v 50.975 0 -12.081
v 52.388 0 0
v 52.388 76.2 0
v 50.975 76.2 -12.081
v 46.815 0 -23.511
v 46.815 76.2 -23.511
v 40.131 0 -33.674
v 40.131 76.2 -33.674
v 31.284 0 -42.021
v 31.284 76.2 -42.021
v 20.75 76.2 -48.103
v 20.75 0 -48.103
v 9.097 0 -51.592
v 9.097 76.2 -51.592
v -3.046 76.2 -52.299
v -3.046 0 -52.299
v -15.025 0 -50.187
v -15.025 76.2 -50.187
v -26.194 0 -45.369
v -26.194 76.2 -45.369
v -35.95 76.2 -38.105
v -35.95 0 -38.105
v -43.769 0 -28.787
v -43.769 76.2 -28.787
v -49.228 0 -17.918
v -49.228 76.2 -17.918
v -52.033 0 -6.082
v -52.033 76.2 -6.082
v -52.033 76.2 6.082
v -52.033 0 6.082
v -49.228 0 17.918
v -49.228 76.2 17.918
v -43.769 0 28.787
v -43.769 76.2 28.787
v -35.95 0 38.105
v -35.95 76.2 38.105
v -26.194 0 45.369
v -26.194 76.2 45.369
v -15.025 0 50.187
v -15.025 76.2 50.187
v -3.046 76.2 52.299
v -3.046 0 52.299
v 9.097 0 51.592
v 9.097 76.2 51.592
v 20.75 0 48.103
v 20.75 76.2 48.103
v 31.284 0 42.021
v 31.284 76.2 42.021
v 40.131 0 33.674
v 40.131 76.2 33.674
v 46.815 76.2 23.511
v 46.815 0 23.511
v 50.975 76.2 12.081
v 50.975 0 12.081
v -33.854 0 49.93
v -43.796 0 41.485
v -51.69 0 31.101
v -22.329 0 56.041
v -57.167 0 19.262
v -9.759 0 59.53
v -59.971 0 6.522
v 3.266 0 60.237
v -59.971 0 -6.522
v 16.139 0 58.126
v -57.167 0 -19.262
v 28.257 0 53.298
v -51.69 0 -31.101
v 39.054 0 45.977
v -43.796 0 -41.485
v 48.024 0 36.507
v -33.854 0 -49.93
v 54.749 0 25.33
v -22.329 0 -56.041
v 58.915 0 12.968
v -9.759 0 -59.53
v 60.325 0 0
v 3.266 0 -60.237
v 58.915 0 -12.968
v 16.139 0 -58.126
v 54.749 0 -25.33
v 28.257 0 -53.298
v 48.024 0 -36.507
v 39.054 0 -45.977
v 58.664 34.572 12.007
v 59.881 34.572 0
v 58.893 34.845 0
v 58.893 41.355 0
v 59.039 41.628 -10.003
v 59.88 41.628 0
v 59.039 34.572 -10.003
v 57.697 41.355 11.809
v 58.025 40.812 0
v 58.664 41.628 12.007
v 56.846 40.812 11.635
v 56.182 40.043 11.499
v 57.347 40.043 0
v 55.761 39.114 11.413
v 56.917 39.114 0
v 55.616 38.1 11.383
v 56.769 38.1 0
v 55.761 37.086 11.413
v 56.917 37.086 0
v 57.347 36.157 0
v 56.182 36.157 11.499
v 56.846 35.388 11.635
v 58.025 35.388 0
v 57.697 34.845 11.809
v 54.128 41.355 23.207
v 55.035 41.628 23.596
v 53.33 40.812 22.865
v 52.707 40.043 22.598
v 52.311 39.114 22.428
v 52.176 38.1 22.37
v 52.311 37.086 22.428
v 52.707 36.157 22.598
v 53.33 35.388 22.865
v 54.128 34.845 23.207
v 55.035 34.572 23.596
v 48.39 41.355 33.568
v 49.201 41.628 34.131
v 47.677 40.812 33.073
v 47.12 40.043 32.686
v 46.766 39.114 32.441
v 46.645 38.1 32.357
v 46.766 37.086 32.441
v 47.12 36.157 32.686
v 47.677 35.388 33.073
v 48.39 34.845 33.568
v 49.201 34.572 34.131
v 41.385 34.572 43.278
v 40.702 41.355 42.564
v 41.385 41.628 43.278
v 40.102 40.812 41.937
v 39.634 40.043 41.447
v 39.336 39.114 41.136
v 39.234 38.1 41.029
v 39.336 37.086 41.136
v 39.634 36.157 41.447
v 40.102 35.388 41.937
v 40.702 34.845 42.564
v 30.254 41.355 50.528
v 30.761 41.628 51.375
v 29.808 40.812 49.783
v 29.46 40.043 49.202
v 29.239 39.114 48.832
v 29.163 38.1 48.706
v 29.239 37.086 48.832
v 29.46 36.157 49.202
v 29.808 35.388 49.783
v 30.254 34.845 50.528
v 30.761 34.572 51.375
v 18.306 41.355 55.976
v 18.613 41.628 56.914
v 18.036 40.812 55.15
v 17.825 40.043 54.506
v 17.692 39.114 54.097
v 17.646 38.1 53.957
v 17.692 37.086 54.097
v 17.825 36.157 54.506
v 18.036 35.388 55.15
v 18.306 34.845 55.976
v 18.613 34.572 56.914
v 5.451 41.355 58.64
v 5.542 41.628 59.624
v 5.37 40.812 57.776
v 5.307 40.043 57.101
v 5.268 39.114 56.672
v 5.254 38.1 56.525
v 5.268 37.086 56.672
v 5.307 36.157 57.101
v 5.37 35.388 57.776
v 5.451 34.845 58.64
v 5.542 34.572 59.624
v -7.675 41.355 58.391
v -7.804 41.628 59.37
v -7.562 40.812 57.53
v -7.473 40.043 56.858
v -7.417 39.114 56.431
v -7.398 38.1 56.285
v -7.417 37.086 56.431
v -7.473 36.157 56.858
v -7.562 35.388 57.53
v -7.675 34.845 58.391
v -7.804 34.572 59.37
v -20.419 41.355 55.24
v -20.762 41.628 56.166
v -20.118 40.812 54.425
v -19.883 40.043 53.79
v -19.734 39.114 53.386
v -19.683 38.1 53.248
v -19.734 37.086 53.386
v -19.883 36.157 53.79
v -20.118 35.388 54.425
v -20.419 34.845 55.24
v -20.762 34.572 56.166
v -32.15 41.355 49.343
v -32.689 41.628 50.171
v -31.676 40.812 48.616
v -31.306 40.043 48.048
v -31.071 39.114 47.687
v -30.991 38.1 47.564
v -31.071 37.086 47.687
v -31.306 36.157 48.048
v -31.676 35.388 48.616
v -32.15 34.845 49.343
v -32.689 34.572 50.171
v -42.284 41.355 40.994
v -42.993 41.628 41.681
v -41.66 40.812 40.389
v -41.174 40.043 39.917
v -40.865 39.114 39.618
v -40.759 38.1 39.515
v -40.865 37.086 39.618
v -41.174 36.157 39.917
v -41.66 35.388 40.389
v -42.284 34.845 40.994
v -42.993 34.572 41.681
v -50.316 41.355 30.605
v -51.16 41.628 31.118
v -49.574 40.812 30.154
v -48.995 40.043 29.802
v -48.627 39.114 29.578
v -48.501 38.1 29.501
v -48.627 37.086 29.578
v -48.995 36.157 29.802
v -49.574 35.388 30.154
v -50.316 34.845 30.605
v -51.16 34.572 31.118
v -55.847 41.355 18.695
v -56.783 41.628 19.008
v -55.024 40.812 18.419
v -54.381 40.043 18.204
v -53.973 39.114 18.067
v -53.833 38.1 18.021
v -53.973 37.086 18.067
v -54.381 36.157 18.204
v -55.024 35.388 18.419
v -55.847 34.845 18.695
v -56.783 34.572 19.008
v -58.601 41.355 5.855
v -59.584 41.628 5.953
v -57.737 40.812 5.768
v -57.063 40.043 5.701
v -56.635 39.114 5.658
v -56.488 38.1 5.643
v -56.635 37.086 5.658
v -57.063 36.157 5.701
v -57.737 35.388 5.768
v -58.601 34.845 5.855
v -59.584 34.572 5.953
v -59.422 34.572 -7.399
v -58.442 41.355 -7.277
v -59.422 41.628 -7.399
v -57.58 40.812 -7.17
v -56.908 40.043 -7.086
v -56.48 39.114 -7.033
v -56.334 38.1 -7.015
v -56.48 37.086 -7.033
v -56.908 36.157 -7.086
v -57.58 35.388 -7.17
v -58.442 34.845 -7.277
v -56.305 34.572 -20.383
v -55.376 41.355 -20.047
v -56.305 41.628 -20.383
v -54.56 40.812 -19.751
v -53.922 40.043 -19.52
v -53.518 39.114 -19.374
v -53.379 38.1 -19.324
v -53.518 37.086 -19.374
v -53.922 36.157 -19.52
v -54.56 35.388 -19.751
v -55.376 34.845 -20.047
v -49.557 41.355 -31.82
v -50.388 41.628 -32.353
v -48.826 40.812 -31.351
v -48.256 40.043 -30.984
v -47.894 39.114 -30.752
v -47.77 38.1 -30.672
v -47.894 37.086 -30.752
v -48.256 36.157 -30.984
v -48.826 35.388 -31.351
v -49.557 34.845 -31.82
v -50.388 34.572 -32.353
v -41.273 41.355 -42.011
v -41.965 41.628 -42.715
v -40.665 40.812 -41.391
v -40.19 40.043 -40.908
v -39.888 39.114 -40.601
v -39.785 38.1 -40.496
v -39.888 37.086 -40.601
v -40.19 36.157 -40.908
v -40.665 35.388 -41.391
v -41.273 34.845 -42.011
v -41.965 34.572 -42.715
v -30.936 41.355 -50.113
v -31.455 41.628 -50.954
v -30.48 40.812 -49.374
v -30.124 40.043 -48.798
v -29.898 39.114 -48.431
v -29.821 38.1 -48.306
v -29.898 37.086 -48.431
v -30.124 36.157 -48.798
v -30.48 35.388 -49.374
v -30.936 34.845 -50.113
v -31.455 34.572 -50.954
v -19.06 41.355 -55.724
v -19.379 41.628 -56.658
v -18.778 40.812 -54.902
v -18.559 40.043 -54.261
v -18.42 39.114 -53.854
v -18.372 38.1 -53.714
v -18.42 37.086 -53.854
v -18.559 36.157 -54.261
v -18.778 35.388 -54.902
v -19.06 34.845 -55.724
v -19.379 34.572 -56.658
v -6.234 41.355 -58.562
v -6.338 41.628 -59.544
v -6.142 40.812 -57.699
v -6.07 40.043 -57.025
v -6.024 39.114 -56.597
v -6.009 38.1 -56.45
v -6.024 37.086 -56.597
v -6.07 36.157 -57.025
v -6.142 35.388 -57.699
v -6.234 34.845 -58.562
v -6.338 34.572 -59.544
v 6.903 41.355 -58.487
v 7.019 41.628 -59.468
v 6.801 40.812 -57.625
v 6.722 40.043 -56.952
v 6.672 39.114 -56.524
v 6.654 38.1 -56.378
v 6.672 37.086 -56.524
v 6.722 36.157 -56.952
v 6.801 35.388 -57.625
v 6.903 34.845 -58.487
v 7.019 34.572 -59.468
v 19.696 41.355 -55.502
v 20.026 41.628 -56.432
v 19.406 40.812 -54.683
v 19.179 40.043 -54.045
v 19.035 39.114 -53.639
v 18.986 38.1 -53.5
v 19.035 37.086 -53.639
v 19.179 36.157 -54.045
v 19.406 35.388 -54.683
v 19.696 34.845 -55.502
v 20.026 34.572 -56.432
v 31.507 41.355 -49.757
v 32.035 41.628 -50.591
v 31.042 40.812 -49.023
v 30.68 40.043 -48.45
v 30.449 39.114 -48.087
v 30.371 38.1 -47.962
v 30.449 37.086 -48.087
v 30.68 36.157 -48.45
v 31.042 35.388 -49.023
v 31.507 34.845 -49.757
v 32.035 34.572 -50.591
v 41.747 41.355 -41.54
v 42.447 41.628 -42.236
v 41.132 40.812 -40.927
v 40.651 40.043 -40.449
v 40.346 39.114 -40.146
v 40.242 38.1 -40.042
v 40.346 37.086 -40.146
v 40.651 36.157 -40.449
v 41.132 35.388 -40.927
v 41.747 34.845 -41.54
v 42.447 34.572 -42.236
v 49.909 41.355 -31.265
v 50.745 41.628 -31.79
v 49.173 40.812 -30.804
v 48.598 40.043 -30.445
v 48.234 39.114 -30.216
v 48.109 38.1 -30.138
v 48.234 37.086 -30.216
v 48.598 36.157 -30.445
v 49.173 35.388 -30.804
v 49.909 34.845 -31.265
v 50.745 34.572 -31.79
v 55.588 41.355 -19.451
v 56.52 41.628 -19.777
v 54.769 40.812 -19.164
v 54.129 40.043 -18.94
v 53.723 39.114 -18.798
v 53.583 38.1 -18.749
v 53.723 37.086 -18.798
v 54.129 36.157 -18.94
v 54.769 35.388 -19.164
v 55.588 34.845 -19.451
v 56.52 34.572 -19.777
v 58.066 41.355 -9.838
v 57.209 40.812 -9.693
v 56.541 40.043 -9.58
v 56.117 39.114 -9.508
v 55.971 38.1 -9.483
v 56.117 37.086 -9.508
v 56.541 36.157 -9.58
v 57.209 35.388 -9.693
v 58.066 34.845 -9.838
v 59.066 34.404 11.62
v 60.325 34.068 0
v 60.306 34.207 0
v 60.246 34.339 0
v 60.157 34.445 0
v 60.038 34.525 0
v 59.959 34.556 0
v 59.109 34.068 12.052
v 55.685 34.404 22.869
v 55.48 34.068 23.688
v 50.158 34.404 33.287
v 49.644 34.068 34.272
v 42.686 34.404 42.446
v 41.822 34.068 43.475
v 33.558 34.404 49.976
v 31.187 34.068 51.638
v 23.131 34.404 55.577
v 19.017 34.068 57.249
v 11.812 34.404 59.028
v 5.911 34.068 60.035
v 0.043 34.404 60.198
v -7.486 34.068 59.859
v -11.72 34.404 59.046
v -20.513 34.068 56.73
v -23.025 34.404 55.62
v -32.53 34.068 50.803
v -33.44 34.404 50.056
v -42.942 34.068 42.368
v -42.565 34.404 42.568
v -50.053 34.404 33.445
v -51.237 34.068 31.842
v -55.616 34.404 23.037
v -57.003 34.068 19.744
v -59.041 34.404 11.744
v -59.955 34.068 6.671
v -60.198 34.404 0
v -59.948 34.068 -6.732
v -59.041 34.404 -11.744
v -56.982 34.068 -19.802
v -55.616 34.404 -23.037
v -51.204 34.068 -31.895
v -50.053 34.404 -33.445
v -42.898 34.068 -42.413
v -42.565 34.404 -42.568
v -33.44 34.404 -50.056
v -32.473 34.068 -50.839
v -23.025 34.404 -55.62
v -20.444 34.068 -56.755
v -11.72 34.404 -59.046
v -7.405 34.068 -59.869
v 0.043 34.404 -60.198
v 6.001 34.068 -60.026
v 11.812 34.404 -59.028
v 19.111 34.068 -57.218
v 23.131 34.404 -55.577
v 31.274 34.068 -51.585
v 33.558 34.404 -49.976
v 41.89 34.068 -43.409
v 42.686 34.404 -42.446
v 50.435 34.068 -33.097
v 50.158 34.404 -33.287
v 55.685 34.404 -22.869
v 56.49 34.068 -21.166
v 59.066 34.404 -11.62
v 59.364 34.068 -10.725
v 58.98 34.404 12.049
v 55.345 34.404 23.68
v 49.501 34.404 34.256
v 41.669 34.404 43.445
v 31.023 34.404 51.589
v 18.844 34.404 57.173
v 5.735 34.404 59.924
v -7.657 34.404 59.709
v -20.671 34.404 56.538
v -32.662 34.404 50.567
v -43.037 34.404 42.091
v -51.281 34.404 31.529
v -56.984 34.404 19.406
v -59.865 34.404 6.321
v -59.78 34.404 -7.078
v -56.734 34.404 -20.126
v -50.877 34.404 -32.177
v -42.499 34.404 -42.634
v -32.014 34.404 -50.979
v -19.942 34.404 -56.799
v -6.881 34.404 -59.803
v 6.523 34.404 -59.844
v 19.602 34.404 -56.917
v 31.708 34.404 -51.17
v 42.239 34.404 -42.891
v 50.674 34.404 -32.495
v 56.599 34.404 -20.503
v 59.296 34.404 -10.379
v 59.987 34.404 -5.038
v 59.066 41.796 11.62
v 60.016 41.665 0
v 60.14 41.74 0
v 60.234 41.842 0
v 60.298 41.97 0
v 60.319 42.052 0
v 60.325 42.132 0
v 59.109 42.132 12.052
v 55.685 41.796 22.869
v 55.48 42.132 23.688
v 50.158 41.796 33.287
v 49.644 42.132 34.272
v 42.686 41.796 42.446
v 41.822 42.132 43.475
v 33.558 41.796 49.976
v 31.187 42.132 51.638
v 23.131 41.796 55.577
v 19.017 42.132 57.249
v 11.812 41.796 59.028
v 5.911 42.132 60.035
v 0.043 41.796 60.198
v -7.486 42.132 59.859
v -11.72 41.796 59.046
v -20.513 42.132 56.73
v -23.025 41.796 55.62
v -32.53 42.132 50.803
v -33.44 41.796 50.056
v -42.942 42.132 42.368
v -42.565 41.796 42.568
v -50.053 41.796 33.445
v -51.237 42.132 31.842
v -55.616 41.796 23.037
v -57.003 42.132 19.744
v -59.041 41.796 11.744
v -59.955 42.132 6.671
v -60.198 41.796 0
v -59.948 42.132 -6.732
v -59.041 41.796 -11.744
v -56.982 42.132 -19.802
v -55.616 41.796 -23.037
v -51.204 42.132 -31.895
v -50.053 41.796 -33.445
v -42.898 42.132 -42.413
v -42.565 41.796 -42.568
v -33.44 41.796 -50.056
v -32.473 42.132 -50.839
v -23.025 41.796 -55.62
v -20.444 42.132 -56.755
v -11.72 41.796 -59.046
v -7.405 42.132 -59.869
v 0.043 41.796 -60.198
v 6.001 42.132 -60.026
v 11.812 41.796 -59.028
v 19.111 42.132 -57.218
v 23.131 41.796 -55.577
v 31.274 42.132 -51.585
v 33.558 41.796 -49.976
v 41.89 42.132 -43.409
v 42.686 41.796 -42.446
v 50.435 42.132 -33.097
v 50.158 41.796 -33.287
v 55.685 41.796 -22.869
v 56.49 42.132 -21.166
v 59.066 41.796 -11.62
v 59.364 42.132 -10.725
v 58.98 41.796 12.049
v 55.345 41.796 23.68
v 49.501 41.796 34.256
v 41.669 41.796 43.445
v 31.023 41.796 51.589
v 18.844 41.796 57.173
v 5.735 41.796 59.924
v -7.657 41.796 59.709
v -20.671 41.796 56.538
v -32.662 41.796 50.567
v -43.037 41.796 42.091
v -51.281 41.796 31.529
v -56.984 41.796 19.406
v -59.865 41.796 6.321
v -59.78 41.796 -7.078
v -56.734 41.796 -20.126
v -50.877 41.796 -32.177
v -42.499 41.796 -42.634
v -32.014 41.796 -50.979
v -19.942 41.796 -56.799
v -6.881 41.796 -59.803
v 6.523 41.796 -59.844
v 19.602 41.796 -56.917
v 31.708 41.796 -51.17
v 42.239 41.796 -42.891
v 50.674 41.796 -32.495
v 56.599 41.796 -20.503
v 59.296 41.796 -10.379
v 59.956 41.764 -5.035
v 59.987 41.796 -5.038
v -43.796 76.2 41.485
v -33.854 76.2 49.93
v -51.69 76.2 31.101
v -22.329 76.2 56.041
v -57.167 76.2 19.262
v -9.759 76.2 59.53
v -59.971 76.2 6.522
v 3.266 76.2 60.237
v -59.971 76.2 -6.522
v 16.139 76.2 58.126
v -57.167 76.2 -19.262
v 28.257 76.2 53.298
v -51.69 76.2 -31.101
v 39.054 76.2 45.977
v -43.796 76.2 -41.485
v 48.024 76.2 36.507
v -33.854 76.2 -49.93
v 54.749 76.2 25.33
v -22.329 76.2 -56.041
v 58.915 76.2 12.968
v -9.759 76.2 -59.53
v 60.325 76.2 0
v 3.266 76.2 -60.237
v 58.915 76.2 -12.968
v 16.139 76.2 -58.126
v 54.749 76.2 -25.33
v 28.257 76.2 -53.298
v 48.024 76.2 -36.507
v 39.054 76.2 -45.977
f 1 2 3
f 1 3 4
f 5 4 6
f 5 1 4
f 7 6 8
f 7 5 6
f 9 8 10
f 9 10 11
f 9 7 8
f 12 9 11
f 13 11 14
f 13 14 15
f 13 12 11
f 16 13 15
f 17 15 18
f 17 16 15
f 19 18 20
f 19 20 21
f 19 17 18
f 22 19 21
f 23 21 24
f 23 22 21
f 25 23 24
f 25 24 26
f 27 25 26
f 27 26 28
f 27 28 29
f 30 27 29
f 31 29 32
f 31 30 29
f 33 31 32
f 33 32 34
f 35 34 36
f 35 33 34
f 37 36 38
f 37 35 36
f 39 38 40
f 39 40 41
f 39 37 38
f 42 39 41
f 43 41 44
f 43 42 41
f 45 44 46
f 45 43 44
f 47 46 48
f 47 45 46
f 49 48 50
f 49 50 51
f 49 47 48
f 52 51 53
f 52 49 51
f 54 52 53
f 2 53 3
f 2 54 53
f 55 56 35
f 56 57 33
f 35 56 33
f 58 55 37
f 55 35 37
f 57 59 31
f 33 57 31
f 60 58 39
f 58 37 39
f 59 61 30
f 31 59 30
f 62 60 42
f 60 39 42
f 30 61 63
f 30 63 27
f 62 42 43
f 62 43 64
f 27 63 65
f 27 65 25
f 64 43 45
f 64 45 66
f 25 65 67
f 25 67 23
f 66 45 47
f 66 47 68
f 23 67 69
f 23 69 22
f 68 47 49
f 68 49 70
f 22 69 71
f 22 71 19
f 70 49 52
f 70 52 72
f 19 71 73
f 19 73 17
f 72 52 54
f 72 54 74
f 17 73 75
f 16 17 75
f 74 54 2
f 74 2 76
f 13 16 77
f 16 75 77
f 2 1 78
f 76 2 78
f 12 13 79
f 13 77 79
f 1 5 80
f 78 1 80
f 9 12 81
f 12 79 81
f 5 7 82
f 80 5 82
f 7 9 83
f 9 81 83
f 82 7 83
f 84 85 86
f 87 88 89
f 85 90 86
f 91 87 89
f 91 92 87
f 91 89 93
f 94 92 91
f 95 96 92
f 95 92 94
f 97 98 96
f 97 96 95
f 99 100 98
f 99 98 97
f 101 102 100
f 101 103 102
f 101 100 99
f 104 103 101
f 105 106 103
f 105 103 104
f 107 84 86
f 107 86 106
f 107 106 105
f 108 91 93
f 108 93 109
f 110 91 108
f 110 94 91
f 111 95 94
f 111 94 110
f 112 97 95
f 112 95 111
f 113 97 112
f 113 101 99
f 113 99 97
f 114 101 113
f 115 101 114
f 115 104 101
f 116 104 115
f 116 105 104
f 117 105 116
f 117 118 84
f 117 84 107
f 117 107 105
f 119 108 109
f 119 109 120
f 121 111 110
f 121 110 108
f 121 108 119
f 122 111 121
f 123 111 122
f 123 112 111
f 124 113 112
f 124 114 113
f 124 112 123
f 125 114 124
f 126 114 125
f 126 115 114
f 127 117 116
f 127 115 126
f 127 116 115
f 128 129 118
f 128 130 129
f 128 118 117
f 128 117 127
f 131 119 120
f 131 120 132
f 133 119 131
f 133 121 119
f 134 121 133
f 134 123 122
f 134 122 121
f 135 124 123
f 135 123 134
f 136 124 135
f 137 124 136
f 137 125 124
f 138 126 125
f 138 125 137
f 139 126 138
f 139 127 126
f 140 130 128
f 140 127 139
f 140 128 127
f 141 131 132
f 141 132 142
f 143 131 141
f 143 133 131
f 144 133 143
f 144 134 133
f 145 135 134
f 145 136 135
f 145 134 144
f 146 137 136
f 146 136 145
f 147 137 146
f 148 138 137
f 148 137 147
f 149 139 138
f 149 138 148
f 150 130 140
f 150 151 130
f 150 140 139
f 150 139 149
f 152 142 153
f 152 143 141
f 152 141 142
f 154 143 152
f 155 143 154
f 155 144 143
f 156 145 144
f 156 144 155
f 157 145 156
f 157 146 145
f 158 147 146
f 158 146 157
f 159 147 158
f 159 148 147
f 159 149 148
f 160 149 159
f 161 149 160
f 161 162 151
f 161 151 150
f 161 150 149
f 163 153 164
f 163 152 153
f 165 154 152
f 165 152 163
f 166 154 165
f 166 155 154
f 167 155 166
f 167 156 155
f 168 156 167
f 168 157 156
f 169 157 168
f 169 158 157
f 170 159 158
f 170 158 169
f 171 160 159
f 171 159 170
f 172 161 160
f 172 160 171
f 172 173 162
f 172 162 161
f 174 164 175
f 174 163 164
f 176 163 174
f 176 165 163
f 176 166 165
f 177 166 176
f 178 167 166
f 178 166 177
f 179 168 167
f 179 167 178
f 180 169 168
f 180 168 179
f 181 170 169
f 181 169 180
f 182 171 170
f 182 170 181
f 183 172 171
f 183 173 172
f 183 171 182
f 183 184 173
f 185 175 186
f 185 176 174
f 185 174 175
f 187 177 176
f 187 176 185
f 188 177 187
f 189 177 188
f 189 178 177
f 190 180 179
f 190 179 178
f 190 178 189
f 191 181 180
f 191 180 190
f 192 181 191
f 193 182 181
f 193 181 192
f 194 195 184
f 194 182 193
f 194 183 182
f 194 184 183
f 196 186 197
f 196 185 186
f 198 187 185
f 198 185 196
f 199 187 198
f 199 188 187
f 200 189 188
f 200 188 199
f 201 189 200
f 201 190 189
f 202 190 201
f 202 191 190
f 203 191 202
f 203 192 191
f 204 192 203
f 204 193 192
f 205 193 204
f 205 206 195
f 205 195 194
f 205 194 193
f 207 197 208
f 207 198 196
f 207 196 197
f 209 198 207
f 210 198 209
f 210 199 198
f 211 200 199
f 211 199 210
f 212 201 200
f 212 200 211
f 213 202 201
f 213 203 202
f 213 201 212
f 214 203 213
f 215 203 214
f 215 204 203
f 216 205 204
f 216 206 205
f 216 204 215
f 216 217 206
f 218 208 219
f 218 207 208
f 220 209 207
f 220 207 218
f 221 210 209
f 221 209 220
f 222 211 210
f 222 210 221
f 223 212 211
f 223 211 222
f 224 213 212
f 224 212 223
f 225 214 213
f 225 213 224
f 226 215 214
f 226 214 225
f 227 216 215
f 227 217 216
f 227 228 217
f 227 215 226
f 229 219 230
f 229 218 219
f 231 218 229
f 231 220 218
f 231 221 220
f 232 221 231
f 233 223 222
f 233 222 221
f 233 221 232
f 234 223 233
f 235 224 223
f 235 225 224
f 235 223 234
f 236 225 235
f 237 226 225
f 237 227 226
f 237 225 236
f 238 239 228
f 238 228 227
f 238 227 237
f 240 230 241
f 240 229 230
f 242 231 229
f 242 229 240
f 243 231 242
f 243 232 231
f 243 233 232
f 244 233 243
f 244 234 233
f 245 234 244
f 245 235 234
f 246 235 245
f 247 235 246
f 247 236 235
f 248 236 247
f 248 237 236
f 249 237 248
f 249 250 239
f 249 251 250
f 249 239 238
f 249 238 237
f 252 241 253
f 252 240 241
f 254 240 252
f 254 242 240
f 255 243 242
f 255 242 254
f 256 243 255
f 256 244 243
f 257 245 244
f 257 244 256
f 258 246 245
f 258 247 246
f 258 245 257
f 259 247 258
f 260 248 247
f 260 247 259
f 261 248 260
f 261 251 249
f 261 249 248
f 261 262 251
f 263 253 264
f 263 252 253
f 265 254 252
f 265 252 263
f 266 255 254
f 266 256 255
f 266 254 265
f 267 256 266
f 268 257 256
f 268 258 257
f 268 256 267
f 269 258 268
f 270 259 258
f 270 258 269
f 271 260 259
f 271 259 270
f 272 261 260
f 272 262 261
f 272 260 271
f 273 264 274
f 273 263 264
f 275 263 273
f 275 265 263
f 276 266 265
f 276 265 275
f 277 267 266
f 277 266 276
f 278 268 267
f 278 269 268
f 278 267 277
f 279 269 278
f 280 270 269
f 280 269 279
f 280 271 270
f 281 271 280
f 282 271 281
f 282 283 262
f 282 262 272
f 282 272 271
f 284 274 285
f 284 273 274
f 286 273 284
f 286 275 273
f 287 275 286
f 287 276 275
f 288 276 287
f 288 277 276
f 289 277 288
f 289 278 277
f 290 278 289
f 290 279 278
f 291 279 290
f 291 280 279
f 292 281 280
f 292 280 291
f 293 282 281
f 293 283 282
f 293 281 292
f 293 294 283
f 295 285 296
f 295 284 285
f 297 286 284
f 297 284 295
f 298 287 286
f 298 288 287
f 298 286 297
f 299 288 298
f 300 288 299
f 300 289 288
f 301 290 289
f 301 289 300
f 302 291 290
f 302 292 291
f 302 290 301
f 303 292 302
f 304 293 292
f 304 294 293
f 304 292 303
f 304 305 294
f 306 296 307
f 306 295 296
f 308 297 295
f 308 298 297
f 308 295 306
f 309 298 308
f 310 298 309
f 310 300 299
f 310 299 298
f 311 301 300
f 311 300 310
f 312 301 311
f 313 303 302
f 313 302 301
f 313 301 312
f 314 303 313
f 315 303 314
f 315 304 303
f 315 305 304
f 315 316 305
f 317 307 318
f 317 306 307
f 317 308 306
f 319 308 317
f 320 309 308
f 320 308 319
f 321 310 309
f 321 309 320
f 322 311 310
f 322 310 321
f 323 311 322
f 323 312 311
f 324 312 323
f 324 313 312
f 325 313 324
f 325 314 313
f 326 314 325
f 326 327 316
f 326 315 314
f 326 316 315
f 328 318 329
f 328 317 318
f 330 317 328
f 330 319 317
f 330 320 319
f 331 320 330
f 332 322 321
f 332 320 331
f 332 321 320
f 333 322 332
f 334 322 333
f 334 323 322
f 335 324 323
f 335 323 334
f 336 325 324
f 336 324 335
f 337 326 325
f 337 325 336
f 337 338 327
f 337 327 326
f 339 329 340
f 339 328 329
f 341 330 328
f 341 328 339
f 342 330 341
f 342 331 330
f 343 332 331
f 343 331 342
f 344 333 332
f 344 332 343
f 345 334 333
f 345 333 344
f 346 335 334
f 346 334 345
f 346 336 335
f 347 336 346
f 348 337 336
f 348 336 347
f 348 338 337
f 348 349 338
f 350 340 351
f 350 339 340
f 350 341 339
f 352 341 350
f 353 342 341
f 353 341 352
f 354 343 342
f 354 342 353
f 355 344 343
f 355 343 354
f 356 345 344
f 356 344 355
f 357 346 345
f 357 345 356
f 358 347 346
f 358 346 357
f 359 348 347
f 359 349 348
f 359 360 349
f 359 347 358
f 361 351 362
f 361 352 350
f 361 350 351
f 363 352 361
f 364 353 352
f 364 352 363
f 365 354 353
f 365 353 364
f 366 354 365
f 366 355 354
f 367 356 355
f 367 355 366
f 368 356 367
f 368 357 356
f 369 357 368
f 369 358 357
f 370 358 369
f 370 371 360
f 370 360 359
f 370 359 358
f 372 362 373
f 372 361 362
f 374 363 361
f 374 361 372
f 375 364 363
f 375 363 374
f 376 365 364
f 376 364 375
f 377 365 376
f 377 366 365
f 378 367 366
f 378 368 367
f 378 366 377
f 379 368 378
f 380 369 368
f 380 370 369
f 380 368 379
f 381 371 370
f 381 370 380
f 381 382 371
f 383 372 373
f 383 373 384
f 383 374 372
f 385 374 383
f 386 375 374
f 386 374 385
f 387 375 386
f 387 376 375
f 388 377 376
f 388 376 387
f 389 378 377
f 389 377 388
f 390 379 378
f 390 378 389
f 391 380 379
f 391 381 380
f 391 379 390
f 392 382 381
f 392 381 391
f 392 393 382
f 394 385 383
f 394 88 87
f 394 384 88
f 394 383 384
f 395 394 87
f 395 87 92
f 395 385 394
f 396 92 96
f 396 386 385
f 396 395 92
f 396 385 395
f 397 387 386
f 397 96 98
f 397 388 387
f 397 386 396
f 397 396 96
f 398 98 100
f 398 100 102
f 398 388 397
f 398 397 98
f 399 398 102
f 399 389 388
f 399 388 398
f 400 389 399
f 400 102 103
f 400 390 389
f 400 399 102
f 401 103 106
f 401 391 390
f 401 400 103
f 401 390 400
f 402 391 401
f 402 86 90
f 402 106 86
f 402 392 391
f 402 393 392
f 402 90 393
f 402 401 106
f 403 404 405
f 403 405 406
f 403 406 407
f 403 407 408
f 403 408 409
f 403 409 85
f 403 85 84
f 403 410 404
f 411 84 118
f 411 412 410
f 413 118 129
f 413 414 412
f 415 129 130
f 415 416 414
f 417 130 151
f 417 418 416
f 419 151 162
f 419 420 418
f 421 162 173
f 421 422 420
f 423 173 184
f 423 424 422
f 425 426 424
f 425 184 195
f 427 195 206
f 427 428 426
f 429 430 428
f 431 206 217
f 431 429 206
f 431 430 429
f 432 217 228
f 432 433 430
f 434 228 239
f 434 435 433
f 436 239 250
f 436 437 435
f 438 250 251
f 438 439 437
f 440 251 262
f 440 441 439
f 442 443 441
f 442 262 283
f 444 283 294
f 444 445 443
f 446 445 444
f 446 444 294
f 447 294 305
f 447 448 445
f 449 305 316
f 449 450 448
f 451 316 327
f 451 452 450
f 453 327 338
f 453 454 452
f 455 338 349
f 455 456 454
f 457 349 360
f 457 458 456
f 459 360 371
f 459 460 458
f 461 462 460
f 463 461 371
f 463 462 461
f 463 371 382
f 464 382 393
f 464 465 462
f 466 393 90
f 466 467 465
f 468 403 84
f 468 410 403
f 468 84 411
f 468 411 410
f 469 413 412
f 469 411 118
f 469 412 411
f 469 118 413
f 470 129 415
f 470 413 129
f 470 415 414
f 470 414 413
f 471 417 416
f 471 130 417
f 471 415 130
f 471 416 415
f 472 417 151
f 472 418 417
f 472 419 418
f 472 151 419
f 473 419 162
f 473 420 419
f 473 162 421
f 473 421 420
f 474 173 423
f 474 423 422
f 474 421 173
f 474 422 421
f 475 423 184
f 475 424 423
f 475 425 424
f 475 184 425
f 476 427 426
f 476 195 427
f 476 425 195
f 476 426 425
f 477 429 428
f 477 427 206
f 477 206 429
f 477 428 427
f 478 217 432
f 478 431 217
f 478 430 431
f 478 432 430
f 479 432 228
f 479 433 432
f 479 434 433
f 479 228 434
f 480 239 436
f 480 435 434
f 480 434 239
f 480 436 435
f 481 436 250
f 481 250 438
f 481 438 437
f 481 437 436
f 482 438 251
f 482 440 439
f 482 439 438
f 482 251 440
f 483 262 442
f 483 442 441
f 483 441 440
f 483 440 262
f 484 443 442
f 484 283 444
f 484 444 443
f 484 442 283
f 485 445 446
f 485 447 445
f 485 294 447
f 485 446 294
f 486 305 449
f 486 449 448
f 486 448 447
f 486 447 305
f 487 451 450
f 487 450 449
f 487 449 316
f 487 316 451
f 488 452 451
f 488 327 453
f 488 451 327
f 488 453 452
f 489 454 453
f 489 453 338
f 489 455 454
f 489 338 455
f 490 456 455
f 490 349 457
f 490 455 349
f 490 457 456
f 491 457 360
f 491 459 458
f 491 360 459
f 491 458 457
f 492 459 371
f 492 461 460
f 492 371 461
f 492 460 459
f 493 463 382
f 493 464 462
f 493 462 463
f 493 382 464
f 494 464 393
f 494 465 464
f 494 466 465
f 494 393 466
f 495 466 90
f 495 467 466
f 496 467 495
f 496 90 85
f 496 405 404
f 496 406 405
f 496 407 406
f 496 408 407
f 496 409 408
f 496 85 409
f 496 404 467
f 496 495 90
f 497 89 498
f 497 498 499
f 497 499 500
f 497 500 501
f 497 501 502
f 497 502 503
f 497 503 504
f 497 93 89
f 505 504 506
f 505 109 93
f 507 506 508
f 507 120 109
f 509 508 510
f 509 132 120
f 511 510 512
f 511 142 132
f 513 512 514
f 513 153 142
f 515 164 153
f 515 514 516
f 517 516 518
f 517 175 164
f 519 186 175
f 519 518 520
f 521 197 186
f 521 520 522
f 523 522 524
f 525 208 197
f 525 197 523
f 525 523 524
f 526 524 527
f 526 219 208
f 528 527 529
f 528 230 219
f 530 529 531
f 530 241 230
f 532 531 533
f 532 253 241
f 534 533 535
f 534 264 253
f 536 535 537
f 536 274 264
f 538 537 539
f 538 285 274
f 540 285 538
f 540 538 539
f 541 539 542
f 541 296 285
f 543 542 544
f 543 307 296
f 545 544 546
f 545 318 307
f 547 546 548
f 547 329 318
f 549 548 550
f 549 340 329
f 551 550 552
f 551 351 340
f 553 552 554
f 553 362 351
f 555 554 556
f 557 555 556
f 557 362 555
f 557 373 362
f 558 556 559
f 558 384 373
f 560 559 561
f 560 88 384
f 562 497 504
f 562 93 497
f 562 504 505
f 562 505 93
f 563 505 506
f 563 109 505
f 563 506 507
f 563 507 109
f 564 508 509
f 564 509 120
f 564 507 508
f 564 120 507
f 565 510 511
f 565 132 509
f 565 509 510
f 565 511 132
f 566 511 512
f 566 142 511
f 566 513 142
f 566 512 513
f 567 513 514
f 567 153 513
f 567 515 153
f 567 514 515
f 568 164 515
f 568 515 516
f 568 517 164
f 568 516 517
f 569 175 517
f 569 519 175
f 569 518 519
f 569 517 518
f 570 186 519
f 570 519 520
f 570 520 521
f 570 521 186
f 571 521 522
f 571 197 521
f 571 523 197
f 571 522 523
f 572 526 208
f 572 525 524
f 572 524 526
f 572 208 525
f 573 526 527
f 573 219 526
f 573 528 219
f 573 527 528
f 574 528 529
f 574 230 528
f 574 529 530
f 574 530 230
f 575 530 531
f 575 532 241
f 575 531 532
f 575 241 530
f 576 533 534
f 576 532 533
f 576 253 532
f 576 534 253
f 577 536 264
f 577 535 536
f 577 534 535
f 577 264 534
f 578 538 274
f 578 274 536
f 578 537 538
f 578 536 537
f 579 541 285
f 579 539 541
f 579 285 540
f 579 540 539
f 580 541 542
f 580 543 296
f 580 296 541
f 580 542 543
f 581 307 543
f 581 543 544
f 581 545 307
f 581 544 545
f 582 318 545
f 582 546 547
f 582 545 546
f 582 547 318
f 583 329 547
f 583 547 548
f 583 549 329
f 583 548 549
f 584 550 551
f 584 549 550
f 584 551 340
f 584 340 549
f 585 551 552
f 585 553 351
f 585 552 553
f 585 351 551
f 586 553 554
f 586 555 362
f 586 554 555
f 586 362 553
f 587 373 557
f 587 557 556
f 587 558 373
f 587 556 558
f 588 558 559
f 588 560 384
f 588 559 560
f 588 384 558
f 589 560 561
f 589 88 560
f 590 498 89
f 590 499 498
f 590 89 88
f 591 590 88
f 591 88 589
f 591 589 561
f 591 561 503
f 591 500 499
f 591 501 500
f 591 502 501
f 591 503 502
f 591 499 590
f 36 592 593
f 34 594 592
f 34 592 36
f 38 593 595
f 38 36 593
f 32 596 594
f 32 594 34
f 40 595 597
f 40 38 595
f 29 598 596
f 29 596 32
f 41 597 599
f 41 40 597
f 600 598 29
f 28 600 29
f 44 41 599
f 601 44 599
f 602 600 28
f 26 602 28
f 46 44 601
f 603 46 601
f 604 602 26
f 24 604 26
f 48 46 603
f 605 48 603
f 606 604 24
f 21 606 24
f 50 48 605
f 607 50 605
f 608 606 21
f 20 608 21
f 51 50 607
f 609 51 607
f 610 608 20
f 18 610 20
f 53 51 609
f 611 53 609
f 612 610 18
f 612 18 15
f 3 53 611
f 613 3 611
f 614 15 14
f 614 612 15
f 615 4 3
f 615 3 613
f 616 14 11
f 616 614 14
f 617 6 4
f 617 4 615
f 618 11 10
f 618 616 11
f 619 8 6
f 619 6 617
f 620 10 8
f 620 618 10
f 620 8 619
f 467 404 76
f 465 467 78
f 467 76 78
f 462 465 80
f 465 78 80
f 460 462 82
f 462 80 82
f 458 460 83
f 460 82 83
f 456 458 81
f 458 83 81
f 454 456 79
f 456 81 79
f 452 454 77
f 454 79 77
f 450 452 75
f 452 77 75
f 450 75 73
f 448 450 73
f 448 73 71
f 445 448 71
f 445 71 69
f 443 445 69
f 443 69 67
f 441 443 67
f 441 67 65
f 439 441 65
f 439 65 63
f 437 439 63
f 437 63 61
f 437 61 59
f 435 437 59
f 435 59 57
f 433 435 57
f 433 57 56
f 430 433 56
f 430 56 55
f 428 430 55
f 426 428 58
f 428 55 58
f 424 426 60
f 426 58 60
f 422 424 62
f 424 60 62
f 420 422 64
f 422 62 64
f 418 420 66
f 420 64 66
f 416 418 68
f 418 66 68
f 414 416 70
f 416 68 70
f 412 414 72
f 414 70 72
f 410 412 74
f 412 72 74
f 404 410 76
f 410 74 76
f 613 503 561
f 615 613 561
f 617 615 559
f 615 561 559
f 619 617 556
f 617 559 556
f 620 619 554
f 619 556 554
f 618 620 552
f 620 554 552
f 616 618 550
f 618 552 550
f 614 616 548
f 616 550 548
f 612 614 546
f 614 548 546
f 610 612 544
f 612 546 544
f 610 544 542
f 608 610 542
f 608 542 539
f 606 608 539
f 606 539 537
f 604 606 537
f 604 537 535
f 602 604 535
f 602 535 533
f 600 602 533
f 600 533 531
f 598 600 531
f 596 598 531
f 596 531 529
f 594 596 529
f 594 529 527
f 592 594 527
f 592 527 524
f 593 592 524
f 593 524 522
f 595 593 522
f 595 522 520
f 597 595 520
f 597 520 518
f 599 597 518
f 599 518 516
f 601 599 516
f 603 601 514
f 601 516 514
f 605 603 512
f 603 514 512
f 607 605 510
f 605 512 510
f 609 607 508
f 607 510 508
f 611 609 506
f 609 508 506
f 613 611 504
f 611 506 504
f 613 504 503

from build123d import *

# Parameters (mm, degrees)
SKETCH1_R           = 60.325
SKETCH1_R_2         = 52.3875
BOSS_EXTRUDE1_DEPTH = 76.2
FILLET1_R           = 0.508


with BuildPart() as part:
    # Sketch1 → Boss-Extrude1 (new body)
    with BuildSketch(Plane(origin=(0, 0, 0), x_dir=(1, 0, 0), z_dir=(0, 1, 0))):
        Circle(SKETCH1_R)
        Circle(SKETCH1_R_2, mode=Mode.SUBTRACT)
    extrude(amount=BOSS_EXTRUDE1_DEPTH)

    # Sketch2 → Cut-Revolve1 (revolve, cut)
    with BuildSketch(Plane.XY):
        with BuildLine():
            ThreePointArc((60.325, 41.656), (56.769, 38.1), (60.325, 34.544))
            Line((60.325, 34.544), (60.325, 41.656))
        make_face()
    revolve(axis=Axis((0, 76.2, 0), (0, -1, 0)), mode=Mode.SUBTRACT)

    # Fillet1
    fillet1_edges = [part.edges().sort_by_distance(p)[0] for p in [
        (-60.325, 34.544, 0),
        (-60.325, 41.656, 0),
    ]]
    fillet(fillet1_edges, radius=FILLET1_R)


solid = part.part
